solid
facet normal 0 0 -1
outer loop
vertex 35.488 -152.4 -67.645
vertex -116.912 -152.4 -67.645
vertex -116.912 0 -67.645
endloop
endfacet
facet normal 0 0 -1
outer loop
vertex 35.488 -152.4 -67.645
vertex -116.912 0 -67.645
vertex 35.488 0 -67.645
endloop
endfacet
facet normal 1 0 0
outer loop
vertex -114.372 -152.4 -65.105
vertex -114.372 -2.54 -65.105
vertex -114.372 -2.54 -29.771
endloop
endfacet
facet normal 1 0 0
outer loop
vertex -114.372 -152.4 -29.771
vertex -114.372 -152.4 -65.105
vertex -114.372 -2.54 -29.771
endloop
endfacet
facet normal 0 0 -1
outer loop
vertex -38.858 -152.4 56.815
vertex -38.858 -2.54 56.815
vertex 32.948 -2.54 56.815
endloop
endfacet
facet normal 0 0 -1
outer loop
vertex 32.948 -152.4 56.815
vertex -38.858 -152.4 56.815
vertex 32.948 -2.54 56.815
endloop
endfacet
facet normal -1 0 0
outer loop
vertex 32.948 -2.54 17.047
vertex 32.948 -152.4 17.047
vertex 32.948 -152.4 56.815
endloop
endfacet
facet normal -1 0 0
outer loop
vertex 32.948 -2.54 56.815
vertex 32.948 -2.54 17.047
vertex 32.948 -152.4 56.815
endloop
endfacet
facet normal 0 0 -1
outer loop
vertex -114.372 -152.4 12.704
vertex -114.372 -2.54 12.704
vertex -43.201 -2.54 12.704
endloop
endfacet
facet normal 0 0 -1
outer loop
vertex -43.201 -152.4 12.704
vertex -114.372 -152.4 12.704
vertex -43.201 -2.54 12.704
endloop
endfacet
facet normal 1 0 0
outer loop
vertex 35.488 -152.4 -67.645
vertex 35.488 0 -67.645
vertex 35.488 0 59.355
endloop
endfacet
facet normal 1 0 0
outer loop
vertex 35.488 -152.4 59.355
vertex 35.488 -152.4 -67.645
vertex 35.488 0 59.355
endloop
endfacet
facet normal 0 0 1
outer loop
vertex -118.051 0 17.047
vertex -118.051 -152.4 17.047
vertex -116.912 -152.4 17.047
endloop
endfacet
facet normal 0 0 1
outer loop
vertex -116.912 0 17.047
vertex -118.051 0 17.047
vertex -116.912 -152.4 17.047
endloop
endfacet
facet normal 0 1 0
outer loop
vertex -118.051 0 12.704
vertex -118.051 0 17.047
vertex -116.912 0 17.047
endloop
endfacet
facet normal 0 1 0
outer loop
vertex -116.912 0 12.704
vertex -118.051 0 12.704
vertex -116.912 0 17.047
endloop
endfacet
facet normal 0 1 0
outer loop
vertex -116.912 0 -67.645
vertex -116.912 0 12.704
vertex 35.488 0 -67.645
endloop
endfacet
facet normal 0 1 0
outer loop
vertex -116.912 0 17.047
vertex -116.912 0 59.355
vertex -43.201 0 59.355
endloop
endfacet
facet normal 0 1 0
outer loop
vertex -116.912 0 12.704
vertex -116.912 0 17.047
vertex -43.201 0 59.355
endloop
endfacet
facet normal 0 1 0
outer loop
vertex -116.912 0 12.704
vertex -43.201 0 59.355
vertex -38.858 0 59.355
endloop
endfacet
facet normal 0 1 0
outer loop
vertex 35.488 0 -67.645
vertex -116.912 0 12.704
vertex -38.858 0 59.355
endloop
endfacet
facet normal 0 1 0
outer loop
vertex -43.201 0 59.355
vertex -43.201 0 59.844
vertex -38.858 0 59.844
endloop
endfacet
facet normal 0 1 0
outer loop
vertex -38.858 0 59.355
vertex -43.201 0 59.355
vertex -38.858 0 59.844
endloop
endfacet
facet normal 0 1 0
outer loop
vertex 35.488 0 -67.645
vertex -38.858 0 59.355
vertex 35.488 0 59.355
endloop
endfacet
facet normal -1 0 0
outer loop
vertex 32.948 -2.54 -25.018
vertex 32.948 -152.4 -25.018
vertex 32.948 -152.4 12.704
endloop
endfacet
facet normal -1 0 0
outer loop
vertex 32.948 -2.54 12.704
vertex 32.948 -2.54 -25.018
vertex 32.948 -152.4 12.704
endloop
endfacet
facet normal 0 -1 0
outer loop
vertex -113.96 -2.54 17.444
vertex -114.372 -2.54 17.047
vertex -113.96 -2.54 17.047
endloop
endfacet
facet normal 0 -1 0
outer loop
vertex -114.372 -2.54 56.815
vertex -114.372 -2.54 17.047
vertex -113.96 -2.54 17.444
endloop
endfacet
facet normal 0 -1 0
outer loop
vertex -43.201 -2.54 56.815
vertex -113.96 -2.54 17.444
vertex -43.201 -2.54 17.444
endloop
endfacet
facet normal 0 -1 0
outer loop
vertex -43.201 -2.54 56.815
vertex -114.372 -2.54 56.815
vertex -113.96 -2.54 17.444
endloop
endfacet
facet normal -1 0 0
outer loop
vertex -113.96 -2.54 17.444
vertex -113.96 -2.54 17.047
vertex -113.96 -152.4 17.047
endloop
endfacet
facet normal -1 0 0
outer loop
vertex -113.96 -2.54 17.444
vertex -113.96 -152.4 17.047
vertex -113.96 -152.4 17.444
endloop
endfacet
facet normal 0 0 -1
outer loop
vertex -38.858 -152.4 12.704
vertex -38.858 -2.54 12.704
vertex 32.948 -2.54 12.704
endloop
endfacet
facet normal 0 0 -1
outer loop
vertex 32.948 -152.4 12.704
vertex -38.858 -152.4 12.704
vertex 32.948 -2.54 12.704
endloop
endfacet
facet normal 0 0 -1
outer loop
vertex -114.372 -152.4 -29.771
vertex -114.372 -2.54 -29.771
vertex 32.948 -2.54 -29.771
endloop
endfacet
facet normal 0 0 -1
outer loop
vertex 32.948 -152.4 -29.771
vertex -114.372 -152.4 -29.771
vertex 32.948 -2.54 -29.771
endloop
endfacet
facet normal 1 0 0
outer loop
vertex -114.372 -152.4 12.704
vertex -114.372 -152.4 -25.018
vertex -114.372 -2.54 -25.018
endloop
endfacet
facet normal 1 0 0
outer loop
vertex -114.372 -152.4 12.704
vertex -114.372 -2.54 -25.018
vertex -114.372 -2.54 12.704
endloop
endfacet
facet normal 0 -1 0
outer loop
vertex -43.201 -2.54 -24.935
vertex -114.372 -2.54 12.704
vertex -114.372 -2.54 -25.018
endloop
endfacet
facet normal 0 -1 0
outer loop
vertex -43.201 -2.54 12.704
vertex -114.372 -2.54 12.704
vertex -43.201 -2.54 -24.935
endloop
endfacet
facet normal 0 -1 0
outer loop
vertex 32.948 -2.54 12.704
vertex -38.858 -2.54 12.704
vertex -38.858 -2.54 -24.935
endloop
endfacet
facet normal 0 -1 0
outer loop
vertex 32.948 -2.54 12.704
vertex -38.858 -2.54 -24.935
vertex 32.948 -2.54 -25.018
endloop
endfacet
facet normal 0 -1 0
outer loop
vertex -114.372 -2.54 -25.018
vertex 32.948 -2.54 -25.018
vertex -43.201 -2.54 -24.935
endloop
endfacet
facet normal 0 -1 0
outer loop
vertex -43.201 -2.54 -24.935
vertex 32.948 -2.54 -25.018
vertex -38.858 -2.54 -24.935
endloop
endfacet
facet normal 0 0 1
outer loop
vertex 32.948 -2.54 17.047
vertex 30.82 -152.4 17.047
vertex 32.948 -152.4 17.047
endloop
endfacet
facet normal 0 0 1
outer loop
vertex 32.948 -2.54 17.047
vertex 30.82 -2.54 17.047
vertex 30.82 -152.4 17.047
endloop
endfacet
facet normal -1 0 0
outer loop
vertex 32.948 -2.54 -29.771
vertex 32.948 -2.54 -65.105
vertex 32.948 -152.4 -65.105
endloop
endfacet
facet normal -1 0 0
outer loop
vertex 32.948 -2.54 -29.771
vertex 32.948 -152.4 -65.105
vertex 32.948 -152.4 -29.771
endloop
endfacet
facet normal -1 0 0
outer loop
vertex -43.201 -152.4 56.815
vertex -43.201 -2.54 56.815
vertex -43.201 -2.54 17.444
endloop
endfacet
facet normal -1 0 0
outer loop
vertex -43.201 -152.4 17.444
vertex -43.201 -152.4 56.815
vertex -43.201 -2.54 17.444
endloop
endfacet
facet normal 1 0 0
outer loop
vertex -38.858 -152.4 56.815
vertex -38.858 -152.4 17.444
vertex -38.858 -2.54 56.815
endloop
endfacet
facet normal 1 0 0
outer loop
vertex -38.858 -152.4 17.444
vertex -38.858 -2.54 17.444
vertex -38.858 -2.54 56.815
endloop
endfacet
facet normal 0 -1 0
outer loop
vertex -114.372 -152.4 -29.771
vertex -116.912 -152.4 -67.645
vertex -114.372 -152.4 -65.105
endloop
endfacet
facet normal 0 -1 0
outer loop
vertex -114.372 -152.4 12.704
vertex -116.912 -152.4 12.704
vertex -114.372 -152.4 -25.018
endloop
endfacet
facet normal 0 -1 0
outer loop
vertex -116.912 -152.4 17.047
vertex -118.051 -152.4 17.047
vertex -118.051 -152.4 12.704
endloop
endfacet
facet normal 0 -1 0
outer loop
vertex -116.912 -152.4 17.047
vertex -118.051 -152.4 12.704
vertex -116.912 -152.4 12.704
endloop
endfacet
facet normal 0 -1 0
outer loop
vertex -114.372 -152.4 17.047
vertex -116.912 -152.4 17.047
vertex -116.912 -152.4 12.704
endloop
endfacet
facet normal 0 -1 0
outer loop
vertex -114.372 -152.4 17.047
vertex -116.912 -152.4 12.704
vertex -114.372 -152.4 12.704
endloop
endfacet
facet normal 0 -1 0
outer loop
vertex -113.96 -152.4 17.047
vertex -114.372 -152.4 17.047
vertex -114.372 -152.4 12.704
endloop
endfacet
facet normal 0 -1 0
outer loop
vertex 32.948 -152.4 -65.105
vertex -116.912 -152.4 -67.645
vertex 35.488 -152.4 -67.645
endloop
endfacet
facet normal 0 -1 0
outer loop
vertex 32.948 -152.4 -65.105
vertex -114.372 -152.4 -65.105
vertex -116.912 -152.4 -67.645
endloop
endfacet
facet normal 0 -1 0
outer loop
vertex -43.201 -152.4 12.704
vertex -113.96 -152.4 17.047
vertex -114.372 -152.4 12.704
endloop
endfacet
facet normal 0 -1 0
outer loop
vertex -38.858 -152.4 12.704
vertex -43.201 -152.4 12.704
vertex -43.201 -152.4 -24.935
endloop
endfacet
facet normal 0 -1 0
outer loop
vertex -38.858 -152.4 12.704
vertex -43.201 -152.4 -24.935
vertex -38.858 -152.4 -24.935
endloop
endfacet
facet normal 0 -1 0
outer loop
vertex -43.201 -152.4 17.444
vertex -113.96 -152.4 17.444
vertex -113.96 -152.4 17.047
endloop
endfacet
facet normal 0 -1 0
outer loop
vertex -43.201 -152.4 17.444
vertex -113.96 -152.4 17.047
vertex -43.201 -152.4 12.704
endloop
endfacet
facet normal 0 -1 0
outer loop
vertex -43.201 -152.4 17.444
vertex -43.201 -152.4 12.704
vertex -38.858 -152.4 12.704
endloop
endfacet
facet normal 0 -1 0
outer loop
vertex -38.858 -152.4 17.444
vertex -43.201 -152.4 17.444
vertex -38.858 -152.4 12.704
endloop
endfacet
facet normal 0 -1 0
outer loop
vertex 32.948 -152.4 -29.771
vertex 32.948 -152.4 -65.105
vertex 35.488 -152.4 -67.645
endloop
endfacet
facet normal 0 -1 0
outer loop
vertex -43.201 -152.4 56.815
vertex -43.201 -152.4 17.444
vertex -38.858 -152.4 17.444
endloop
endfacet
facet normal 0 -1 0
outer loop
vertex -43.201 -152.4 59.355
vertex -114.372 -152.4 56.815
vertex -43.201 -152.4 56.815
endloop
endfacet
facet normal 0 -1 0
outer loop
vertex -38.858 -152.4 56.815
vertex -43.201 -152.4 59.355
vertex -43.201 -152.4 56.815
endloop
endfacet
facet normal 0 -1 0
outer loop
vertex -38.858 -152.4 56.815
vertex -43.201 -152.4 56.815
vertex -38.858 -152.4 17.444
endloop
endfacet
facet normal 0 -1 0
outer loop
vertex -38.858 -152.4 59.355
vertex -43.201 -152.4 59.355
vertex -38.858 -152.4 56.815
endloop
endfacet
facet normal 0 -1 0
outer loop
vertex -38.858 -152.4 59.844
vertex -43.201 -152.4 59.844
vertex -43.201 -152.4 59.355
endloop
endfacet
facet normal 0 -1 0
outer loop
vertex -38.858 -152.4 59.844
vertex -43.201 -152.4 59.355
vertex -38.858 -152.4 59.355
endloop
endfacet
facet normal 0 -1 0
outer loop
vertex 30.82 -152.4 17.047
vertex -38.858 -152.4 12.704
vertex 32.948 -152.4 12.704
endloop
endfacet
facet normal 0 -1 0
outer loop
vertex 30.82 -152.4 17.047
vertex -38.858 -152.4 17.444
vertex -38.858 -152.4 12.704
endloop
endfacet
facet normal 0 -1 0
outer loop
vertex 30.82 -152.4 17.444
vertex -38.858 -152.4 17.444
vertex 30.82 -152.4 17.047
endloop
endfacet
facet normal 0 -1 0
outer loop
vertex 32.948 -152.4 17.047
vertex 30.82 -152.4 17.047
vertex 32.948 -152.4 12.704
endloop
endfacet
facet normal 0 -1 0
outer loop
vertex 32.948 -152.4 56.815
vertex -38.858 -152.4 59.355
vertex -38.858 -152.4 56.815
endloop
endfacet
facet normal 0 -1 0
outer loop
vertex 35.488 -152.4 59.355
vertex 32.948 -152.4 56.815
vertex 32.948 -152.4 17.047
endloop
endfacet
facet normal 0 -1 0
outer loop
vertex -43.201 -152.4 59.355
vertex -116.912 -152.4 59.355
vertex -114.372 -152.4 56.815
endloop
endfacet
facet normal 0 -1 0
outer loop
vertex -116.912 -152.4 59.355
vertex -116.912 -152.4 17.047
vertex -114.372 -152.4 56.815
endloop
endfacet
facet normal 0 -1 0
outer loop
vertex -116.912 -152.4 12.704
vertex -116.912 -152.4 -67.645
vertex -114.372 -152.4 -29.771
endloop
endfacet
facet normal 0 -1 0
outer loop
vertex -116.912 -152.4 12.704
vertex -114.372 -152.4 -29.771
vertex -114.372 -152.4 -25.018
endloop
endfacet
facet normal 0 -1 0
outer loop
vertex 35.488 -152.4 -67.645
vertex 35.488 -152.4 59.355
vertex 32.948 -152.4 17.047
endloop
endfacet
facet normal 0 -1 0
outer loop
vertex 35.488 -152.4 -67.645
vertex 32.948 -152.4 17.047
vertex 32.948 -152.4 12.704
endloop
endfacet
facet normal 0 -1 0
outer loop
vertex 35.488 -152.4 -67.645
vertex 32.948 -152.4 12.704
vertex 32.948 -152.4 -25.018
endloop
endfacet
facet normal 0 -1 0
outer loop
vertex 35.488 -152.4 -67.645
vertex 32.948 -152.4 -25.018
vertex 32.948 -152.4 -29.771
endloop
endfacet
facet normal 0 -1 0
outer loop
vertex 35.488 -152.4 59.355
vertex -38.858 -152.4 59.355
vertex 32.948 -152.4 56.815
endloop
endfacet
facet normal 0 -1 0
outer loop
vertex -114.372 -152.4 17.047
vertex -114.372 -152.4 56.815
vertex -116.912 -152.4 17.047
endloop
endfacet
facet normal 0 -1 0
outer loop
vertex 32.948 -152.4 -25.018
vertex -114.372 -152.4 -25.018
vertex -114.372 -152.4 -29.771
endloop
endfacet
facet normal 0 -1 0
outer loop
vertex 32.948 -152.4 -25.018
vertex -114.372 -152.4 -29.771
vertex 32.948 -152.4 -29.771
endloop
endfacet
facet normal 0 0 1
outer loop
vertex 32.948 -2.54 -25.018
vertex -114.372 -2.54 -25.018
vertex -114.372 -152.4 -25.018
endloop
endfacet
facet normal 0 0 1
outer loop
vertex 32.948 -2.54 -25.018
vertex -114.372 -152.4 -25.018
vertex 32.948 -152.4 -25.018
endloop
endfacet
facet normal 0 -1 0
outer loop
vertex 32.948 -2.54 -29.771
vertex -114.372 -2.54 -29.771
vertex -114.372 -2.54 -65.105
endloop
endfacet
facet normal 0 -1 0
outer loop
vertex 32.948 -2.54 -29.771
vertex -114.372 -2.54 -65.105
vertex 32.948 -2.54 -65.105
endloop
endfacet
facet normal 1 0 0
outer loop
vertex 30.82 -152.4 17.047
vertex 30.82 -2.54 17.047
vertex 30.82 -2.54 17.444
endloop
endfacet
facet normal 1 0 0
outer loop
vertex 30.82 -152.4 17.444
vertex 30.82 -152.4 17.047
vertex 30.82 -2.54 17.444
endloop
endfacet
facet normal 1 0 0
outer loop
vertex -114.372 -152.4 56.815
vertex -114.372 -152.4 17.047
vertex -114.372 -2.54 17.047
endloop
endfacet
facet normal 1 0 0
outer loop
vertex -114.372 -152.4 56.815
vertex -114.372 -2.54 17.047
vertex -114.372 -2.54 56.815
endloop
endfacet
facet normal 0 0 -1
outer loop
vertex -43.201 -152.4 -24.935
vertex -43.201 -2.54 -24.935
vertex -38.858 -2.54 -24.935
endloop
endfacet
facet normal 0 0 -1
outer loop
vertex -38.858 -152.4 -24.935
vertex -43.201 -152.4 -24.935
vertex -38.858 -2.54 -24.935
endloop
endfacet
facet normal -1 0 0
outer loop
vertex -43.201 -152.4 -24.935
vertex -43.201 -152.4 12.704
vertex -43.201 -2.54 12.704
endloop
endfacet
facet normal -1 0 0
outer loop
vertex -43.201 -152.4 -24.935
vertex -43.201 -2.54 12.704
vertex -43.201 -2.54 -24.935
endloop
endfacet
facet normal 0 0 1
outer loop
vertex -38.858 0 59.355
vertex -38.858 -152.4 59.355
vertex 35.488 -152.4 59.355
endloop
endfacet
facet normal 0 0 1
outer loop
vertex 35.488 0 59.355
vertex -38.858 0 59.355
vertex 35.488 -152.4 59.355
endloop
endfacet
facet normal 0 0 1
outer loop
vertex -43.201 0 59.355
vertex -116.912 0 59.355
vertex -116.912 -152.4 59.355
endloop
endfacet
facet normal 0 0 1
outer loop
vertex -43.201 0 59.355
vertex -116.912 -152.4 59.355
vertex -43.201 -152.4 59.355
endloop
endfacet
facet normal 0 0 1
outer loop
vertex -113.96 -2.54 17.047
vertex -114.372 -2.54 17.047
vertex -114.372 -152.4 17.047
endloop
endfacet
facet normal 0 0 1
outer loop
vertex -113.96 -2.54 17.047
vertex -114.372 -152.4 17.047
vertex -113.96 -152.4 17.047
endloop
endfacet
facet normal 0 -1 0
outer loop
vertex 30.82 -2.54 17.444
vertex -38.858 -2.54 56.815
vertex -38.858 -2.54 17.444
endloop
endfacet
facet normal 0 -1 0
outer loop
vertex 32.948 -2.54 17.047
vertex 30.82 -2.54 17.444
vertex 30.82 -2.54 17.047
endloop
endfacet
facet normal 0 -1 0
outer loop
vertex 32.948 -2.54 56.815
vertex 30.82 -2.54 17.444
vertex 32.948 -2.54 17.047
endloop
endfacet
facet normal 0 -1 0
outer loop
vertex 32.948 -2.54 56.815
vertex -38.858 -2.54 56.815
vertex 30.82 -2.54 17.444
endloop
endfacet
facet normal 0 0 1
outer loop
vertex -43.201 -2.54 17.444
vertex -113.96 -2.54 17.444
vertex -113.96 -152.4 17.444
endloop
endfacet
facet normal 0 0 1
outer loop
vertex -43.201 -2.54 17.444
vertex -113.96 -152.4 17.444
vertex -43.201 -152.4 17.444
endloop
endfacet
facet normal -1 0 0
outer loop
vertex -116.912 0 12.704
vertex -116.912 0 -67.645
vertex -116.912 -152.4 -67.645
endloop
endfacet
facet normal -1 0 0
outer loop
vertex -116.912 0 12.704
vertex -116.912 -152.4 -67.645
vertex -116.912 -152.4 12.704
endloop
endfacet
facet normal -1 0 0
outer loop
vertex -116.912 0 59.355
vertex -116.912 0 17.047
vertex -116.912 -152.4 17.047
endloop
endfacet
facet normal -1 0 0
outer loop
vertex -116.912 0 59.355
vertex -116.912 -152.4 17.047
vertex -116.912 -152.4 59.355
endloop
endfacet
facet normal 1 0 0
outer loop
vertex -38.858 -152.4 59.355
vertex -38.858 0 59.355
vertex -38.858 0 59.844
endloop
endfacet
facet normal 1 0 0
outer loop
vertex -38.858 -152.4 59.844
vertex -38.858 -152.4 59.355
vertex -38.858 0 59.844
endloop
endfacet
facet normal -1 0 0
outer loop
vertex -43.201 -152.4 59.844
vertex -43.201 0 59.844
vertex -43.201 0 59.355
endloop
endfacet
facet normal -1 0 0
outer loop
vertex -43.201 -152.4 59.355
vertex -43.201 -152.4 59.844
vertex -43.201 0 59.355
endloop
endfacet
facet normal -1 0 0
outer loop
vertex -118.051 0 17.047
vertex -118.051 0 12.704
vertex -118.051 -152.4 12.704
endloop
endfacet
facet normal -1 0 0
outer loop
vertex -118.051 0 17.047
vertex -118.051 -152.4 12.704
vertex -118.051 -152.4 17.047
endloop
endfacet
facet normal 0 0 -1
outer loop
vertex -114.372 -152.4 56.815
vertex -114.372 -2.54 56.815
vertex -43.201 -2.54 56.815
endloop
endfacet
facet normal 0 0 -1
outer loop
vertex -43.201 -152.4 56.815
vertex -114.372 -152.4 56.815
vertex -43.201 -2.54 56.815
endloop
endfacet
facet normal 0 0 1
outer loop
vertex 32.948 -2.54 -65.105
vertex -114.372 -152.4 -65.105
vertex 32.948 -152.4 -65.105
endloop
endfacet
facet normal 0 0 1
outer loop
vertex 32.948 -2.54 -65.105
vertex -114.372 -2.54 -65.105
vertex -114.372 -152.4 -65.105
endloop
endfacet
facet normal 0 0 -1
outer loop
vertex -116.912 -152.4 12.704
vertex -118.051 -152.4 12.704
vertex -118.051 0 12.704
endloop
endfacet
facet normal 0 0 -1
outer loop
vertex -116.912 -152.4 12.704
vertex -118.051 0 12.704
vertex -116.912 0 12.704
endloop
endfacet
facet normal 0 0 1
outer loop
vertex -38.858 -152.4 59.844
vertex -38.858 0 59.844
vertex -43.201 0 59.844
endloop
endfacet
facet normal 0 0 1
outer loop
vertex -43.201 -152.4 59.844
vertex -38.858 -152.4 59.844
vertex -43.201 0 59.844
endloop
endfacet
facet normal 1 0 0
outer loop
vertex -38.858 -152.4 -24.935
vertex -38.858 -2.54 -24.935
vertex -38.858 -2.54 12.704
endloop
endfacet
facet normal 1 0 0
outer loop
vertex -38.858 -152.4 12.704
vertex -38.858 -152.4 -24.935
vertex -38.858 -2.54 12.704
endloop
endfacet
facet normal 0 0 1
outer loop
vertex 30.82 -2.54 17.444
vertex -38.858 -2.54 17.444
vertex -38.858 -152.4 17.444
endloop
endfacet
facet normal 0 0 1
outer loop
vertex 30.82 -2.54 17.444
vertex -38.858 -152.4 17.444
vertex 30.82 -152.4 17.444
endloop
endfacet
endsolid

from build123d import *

# Parameters (mm, degrees)
F0_W     = 152.4
F0_H     = 127
F1_DEPTH = 152.4
F2_T     = -2.54
F3_W     = 144.78
F3_H     = 4.651744
F3_W_2   = 149.86
F3_H_2   = 4.752902
F4_DEPTH = 152.4
F5_W     = 152.4
F5_H     = 4.3434
F6_DEPTH = 152.4
F8_DEPTH = 152.4


with BuildPart() as f1:
    # F0 (on Front) → F1 (new body)
    with BuildSketch(Plane.XZ):
        with Locations((-40.71237, -4.145074)):
            Rectangle(F0_W, F0_H)
    extrude(amount=F1_DEPTH)

    # F2
    f2_openings = [f1.faces().sort_by_distance(p)[0] for p in [
        (-40.71237, -152.4, -4.145074),
    ]]
    offset(amount=F2_T, openings=f2_openings)

    # F3 (on Front) → F4 (join)
    with BuildSketch(Plane.XZ):
        with Locations((-41.570326, 15.118169)):
            Rectangle(F3_W, F3_H)
        with Locations((-39.960672, -27.394711)):
            Rectangle(F3_W_2, F3_H_2)
    extrude(amount=F4_DEPTH)

    # F5 (on Front) → F6 (join)
    with BuildSketch(Plane.XZ):
        with Locations((-41.850881, 14.875366)):
            Rectangle(F5_W, F5_H)
    extrude(amount=F6_DEPTH)

    # F7 (on Front) → F8 (join)
    with BuildSketch(Plane.XZ):
        Polygon((-38.857852, 59.844222), (-41.029552, 59.844222), (-43.201252, 59.844222), (-43.201252, -24.935095), (-38.857852, -24.935095), align=None)
    extrude(amount=F8_DEPTH)


solid = f1.part
